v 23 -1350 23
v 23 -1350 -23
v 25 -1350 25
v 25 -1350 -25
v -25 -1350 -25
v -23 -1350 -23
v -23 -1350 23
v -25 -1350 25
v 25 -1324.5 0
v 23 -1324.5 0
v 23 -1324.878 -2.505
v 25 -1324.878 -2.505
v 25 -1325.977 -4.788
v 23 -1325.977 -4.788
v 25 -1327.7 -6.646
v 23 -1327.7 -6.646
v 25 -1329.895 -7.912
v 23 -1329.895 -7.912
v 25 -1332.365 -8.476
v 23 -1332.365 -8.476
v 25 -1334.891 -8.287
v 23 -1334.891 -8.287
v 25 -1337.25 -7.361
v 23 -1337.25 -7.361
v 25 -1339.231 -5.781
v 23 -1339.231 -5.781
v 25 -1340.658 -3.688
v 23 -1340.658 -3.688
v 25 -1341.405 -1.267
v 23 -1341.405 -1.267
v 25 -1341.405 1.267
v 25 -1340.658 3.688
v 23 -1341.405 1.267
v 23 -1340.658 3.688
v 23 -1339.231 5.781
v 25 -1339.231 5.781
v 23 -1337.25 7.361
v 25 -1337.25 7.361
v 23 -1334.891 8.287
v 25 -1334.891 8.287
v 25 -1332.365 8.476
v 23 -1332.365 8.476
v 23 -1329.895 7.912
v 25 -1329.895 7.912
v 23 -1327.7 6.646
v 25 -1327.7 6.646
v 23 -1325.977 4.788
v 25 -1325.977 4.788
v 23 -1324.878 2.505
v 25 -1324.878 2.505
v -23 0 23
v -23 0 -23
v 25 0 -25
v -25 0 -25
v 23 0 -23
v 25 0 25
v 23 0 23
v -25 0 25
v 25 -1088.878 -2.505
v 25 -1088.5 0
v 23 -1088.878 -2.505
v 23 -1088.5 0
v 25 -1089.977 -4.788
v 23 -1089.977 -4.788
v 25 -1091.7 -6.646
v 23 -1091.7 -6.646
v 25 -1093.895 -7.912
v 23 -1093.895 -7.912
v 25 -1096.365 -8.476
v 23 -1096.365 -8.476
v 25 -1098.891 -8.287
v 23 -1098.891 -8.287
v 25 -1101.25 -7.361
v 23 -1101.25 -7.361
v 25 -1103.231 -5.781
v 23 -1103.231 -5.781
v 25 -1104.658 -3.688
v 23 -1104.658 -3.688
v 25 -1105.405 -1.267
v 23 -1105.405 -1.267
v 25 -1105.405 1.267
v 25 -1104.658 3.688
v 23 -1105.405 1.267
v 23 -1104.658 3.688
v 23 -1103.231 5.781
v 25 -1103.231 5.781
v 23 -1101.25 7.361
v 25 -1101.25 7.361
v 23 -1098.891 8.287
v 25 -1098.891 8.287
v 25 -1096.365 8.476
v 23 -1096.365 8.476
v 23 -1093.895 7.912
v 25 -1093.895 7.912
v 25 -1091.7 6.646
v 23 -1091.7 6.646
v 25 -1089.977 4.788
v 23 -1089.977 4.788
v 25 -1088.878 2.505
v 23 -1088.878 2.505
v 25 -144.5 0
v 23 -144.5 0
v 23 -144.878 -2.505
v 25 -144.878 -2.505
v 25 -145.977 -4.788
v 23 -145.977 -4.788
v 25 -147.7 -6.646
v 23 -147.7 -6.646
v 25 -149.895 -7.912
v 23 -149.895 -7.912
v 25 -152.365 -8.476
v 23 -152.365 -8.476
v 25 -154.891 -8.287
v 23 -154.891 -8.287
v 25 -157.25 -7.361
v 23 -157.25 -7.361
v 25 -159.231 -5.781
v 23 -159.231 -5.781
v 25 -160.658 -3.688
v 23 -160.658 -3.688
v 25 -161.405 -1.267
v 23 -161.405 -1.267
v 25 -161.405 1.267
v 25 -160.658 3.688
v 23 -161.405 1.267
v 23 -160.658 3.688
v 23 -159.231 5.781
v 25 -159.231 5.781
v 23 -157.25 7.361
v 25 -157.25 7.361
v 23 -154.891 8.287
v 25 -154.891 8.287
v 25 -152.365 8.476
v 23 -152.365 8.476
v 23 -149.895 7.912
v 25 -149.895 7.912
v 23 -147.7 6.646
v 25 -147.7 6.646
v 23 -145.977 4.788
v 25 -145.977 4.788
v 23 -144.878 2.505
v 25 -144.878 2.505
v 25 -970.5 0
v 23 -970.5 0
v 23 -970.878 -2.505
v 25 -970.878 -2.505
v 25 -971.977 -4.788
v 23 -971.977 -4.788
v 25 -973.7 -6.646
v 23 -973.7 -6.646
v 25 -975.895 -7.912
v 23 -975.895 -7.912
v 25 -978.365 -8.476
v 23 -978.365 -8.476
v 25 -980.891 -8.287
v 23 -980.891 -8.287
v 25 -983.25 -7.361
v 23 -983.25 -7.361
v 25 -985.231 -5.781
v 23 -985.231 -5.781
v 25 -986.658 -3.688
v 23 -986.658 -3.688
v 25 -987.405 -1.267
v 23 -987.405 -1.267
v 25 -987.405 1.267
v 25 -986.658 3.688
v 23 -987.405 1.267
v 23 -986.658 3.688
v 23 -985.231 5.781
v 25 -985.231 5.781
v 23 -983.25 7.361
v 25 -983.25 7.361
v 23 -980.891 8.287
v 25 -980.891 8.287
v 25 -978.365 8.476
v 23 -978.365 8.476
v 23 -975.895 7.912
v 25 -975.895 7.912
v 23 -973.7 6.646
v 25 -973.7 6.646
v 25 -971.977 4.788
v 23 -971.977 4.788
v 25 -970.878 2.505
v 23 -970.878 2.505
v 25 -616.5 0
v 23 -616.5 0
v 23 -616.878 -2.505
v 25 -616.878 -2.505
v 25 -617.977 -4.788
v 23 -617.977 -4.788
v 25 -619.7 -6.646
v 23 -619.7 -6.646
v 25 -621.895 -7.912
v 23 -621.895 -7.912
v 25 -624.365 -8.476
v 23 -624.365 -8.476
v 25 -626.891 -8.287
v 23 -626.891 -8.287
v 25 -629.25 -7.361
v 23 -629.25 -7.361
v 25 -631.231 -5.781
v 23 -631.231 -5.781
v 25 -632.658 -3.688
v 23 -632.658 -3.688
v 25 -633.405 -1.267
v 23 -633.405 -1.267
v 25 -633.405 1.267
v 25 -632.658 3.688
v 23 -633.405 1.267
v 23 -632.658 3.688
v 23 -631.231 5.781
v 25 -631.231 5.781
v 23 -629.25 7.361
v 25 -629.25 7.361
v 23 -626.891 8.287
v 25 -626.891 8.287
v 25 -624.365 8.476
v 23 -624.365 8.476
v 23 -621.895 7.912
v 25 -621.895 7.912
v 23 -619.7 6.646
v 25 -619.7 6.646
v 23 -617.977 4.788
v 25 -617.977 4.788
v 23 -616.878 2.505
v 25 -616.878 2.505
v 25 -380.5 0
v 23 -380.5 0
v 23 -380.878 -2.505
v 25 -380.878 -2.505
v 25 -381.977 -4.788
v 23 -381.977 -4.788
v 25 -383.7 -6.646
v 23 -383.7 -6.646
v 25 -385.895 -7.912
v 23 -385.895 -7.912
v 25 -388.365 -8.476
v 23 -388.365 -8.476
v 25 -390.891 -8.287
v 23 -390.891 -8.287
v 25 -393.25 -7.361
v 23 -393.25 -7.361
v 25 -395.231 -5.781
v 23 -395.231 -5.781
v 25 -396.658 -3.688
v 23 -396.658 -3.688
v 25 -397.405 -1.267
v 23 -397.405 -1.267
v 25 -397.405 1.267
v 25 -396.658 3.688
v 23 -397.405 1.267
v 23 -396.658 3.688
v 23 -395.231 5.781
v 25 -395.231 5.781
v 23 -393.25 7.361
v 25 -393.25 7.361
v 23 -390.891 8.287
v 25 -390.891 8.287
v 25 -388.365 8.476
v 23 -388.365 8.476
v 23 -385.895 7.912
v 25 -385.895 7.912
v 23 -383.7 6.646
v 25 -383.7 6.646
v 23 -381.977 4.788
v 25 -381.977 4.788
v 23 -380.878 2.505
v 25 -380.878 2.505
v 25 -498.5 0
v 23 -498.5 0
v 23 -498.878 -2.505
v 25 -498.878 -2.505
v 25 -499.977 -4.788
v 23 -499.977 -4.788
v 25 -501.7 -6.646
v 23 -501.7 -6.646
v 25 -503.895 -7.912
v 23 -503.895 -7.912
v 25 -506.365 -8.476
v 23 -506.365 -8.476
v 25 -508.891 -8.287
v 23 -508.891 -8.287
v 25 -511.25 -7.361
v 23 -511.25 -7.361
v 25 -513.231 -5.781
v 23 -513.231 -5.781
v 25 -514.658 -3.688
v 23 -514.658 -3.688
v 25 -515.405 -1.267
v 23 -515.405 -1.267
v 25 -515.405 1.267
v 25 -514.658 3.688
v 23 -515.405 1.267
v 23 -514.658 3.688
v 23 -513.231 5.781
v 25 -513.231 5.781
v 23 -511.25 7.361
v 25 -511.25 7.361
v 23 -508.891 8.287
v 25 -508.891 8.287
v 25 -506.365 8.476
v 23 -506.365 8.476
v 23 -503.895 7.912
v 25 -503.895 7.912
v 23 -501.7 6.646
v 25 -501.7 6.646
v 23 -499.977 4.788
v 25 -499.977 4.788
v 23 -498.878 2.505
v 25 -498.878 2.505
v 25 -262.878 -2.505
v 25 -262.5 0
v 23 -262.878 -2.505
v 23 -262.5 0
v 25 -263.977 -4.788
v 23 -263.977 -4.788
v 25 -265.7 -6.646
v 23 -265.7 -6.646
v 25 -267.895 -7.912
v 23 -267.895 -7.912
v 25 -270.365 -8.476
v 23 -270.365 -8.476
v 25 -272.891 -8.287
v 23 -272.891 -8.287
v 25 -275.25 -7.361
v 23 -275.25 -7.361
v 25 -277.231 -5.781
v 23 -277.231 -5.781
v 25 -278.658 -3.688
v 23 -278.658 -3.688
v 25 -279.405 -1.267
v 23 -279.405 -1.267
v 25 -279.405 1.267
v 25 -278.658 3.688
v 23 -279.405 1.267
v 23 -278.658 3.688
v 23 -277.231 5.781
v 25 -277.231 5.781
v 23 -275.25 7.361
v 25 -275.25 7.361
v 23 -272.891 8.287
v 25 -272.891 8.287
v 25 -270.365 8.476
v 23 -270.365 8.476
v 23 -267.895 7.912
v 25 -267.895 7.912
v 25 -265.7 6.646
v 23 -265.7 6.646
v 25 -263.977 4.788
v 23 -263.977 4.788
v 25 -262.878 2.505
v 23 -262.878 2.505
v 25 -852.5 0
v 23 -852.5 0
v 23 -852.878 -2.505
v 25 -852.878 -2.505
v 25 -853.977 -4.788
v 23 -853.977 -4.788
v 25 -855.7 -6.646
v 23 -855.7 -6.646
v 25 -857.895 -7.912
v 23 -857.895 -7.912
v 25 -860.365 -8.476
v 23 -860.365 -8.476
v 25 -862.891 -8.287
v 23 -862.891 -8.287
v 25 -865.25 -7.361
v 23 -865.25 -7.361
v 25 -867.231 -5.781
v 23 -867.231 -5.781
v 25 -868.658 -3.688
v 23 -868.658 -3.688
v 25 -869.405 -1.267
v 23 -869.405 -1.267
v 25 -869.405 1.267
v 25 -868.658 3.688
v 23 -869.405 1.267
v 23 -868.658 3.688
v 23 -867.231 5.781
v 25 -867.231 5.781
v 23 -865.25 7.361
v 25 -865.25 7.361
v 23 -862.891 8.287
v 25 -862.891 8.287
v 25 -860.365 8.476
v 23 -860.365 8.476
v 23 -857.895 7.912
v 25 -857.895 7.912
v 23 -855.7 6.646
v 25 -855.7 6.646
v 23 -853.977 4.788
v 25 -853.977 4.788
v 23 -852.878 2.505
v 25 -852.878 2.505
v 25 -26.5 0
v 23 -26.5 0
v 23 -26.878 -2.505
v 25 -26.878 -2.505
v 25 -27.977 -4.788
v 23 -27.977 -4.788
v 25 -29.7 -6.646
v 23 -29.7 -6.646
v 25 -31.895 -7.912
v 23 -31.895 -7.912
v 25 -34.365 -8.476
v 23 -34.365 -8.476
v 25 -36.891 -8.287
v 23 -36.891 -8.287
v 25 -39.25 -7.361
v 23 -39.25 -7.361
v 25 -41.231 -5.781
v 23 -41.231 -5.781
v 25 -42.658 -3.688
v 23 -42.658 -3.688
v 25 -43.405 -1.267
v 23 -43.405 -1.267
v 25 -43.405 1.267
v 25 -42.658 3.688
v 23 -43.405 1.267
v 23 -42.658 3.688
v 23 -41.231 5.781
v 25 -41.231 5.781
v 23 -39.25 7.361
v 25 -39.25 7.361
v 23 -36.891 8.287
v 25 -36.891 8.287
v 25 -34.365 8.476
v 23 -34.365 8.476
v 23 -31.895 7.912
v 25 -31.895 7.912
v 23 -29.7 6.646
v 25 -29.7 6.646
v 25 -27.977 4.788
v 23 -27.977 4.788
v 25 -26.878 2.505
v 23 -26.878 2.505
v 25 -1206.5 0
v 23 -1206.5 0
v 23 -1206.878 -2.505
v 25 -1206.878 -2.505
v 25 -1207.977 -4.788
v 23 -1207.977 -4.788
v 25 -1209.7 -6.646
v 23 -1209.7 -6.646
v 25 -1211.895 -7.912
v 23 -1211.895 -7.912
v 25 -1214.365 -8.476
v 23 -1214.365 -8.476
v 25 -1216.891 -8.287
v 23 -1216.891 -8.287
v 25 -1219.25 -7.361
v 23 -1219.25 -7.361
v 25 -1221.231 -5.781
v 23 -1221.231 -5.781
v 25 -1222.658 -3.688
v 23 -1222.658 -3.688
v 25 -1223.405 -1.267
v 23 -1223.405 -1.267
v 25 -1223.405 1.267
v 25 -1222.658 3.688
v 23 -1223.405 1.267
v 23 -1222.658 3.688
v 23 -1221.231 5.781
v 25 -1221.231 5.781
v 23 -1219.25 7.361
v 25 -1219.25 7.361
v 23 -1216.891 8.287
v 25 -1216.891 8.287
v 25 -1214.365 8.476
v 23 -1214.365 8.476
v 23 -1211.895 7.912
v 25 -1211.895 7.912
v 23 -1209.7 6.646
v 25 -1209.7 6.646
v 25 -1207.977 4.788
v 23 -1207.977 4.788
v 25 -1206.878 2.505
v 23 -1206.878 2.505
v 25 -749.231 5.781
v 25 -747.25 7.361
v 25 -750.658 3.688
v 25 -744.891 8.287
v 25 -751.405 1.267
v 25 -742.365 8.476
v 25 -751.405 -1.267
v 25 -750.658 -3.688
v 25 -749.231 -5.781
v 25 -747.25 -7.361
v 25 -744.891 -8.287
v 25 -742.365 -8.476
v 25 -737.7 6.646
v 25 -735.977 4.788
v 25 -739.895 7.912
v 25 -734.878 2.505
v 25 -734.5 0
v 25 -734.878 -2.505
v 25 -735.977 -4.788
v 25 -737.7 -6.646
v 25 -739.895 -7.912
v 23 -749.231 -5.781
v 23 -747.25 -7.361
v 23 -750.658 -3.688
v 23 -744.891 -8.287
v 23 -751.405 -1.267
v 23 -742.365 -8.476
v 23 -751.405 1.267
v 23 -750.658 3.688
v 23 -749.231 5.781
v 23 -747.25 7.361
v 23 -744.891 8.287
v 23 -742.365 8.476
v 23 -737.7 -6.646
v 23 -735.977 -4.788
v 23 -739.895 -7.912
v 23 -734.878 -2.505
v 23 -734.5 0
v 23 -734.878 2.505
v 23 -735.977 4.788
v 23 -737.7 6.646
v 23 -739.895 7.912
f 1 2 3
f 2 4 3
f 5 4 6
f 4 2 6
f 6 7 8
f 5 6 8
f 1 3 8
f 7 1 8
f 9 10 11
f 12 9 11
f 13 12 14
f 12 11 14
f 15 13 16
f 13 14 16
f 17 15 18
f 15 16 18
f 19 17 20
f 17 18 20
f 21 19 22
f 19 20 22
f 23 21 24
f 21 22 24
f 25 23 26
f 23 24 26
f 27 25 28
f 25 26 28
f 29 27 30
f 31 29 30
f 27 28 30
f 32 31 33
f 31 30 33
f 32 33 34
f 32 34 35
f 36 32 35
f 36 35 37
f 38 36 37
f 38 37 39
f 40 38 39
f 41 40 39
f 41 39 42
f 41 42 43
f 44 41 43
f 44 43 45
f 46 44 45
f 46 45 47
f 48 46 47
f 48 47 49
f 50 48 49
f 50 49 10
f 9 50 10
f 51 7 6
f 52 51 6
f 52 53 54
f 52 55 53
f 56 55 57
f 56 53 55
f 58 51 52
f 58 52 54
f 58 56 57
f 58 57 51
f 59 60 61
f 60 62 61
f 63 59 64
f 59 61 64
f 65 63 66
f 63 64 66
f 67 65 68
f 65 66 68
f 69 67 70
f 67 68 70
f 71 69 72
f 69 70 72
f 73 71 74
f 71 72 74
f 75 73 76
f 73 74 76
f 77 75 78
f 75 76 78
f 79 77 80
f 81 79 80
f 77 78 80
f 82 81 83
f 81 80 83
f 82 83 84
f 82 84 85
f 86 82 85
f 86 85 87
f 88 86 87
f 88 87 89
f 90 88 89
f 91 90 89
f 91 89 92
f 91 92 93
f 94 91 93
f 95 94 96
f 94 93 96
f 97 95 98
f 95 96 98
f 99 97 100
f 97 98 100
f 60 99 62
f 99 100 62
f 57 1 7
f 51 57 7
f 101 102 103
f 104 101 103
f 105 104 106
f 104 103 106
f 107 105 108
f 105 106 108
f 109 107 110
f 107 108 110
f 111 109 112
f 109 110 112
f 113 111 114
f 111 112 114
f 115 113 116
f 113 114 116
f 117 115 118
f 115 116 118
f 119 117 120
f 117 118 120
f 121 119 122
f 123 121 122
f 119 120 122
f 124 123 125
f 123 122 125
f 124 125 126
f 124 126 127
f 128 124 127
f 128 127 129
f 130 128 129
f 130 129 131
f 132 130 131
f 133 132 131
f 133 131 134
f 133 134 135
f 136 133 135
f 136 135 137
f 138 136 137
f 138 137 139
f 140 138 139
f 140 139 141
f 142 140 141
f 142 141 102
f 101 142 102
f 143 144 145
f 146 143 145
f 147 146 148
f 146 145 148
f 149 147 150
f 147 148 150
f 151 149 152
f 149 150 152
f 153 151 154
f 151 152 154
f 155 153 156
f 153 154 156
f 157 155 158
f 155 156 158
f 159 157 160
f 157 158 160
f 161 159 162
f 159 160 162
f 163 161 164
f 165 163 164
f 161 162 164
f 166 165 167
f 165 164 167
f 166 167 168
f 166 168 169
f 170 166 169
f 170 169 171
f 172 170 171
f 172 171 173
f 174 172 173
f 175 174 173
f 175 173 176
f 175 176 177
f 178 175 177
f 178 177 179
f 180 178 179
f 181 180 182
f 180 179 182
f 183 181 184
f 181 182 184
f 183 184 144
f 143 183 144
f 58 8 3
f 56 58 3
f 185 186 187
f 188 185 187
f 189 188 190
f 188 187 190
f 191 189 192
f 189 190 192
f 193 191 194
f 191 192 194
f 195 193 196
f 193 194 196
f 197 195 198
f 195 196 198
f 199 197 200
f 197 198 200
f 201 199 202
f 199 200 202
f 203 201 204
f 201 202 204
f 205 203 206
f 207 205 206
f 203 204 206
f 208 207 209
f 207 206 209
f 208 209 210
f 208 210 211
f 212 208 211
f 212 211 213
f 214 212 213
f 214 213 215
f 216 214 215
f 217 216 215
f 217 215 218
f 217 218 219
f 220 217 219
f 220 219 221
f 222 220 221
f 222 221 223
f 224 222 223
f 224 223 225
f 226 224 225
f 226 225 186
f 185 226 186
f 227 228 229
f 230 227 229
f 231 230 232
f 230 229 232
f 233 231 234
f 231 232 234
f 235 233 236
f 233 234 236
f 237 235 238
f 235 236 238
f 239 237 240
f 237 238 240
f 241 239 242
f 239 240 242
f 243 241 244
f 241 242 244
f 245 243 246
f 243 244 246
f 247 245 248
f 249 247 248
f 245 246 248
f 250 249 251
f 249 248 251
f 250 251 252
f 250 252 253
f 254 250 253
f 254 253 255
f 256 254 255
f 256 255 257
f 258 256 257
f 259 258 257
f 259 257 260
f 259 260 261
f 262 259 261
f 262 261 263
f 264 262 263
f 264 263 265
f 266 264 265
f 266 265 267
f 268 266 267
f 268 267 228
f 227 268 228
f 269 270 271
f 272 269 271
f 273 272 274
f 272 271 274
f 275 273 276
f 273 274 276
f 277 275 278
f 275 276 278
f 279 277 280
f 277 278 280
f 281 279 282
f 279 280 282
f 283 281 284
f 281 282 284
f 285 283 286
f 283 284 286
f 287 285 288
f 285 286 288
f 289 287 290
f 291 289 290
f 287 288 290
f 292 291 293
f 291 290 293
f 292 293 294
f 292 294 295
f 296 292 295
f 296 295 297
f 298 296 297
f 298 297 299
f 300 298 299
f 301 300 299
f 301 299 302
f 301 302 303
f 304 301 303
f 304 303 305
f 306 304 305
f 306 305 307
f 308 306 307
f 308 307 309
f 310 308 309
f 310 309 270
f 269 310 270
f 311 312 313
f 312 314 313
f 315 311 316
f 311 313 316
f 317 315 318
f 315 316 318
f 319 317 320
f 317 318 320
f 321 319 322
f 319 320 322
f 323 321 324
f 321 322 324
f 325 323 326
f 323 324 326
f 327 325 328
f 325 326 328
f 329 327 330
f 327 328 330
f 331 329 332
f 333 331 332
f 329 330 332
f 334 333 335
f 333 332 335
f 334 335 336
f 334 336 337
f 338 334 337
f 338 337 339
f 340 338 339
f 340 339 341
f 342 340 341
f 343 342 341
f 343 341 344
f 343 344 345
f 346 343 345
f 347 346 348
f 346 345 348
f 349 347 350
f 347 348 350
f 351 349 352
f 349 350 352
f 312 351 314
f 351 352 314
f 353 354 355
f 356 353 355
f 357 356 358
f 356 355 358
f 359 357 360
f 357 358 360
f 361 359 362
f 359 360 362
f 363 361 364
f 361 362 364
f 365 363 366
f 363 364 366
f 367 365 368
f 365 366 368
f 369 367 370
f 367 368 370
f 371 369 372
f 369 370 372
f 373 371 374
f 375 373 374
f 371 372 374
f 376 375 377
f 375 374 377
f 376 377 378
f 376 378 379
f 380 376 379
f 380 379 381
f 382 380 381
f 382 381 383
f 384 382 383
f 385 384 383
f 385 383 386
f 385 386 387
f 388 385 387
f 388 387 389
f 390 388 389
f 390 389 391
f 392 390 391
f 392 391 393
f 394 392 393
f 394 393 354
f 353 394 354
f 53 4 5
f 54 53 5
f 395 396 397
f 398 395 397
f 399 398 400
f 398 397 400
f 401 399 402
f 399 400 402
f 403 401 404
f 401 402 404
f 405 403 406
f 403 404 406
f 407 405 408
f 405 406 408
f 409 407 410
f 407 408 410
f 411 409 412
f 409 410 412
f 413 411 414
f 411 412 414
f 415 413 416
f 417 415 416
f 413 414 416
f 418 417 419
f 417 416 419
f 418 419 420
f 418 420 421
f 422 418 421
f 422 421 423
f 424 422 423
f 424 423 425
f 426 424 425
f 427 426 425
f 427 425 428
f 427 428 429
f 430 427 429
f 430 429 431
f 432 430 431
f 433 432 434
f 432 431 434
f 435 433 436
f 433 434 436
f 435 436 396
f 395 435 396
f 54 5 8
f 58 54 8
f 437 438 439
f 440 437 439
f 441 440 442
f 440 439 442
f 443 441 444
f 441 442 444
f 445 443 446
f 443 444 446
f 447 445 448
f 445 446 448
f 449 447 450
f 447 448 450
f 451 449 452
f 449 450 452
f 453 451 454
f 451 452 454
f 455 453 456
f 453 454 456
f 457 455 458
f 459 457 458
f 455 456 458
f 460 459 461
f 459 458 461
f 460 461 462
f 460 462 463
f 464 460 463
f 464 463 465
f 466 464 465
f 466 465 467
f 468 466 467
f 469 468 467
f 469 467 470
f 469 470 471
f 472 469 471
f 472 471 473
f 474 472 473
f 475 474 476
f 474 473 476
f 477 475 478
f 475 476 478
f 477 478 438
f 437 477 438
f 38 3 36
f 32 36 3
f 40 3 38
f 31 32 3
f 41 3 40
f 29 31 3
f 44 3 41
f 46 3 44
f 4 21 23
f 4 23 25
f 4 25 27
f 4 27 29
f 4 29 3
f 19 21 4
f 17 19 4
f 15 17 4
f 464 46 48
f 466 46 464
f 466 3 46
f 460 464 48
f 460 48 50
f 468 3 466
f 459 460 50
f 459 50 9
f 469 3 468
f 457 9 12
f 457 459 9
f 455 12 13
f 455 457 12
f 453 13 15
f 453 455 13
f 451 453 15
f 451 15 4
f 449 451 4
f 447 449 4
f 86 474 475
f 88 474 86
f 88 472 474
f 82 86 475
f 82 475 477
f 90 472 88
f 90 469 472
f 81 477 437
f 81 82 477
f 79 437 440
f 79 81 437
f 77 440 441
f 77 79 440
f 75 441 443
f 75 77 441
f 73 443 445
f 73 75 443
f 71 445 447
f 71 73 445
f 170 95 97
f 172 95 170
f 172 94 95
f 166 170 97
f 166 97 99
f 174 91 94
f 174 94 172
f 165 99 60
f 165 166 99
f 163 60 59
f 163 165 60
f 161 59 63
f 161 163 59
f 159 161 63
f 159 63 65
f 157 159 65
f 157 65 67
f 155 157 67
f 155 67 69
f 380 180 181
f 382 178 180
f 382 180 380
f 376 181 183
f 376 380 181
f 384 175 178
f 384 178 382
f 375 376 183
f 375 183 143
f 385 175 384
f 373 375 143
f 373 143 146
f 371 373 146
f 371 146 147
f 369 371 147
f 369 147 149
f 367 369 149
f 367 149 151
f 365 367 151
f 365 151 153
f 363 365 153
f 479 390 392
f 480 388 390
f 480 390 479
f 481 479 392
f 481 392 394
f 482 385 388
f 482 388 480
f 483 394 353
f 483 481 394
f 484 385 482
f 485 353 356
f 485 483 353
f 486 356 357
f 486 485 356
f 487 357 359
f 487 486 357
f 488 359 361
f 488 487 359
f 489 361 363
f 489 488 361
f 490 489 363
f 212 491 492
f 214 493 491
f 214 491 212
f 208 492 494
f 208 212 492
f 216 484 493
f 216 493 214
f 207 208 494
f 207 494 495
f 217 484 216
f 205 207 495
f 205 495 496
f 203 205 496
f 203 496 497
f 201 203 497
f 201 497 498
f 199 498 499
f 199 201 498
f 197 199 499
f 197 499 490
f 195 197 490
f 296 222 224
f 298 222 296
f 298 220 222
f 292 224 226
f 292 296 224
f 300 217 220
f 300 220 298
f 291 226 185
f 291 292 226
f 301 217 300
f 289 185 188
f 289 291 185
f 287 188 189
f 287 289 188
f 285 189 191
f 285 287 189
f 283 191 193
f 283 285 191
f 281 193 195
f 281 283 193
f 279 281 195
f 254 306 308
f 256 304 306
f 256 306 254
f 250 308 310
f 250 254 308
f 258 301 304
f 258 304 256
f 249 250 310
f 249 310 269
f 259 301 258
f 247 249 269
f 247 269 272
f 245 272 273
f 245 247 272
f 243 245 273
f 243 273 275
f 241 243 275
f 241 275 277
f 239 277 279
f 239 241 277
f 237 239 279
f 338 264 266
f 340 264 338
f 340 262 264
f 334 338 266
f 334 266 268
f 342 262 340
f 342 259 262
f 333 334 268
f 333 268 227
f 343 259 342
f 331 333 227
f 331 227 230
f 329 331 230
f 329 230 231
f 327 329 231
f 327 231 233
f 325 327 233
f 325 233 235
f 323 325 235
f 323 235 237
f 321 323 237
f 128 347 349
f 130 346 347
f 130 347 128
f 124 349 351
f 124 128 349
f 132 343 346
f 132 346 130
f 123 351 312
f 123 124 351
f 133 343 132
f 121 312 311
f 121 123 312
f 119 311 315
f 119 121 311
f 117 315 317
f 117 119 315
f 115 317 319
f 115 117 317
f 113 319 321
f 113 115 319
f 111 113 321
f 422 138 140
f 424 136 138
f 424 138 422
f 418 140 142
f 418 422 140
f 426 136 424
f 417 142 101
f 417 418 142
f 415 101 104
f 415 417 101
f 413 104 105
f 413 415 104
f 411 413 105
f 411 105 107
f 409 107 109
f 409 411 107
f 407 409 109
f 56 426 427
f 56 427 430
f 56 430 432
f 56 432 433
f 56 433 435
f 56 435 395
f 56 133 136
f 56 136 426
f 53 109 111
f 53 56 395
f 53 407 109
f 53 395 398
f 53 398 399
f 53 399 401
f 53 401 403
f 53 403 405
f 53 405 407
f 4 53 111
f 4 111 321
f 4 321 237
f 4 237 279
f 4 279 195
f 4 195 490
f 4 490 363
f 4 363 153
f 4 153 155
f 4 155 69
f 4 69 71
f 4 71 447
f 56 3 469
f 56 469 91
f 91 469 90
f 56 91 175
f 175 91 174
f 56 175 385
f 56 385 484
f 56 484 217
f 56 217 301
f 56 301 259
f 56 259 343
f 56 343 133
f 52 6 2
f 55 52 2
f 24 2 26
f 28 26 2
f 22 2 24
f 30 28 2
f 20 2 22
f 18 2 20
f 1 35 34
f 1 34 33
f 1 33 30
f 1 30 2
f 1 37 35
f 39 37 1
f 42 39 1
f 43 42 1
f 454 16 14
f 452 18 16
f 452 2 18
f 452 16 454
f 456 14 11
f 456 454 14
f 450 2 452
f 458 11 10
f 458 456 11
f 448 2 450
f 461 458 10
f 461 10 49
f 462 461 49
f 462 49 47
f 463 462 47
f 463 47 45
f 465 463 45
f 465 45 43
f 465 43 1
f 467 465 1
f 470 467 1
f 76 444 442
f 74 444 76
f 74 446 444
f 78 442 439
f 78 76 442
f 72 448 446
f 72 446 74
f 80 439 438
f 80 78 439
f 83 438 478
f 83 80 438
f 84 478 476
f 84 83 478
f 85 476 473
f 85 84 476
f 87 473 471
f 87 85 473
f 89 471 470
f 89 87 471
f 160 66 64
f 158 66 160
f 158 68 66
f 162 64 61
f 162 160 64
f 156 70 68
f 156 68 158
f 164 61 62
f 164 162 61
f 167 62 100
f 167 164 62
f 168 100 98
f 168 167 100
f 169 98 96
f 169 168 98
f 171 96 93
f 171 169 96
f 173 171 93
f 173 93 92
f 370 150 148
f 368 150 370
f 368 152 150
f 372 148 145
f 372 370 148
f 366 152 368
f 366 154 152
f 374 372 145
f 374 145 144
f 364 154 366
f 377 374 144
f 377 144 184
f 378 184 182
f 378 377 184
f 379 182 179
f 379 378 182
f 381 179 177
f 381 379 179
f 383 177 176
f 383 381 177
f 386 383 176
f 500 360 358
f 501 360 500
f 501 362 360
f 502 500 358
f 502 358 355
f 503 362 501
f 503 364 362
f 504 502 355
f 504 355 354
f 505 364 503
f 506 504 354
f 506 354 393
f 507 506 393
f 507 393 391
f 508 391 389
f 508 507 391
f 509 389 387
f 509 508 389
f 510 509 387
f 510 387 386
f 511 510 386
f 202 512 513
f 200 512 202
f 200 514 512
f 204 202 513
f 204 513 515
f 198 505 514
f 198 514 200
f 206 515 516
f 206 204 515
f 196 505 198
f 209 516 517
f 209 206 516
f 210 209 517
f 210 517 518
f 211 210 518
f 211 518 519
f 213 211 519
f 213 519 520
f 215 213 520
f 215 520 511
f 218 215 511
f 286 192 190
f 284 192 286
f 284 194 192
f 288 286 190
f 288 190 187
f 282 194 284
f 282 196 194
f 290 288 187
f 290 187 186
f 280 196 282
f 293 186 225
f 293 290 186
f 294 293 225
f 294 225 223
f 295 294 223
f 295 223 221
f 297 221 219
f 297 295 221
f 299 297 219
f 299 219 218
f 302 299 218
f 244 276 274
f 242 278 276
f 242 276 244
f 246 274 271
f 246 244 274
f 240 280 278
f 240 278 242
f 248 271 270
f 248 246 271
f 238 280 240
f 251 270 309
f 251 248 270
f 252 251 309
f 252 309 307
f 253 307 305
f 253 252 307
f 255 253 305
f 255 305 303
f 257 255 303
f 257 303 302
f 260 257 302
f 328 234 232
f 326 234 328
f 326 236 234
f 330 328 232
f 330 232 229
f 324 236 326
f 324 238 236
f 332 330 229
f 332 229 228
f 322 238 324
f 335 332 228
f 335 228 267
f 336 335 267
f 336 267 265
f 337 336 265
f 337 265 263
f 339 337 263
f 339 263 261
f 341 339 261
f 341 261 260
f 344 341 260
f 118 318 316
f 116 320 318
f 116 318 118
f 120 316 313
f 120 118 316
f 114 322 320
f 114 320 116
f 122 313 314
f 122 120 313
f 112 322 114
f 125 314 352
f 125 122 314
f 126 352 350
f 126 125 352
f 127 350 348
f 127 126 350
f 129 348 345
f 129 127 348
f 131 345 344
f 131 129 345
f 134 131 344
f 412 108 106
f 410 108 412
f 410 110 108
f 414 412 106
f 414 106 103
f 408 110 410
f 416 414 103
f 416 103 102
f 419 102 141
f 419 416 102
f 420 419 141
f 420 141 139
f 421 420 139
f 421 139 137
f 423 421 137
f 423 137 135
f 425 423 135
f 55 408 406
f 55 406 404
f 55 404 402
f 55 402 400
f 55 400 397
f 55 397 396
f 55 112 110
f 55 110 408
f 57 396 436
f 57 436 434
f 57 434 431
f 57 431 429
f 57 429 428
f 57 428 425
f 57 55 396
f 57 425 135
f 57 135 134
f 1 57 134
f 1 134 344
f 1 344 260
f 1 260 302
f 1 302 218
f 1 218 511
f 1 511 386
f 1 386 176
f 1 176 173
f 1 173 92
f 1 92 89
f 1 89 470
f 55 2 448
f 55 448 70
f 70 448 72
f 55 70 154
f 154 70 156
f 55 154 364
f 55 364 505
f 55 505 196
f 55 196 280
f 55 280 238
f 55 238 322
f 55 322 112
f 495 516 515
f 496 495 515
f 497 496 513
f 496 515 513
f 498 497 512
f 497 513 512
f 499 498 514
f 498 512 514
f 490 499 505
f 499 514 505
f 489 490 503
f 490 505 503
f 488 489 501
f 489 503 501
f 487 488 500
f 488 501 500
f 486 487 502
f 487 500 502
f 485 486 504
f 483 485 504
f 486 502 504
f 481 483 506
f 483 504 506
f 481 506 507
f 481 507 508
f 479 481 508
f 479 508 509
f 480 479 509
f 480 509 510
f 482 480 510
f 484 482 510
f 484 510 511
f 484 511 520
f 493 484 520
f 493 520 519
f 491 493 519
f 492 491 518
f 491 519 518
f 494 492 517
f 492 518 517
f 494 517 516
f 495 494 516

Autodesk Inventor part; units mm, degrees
ref_plane "YZ Plane" through (0, 0, 0) normal (1, 0, 0) x (0, 1, 0)
ref_plane "XZ Plane" through (0, 0, 0) normal (0, 1, 0) x (-1, 0, 0)
ref_plane "XY Plane" through (0, 0, 0) normal (0, 0, 1) x (1, 0, 0)
sketch "Sketch9" plane through (0, 0, 0) normal (0, 1, 0) x (-1, 0, 0)
  line L0 (25, 25) -> (-25, 25)
  line L1 (-25, 25) -> (-25, -25)
  line L2 (-25, -25) -> (25, -25)
  line L3 (25, -25) -> (25, 25)
  line L4 (25, 25) -> (-25, -25) construction
  line L5 (-25, 25) -> (25, -25) construction
  line L6 (-23, 23) -> (23, 23)
  line L7 (23, 23) -> (23, -23)
  line L8 (23, -23) -> (-23, -23)
  line L9 (-23, -23) -> (-23, 23)
  point P0 (0, 0)
  dimension "d172" = 50
  dimension "d173" = 50
  dimension "d174" = 2
extrude "Extrusion3" add sketch "Sketch9" against normal blind 1350
sketch "Sketch10" plane through (0, 0, 0) normal (1, 0, 0) x (0, 1, 0)
  line L0 (0, 25) -> (0, -25) construction
  line L1 (0, 25) -> (-1350, 25) construction
  line L2 (-1350, -25) -> (-1350, 25) construction
  line L3 (0, -25) -> (-1350, -25) construction
  line L4 (-43.5, 8.5) -> (-26.5, 8.5)
  line L5 (-26.5, 8.5) -> (-26.5, -8.5)
  line L6 (-26.5, -8.5) -> (-43.5, -8.5)
  line L7 (-43.5, -8.5) -> (-43.5, 8.5)
  line L8 (-43.5, 8.5) -> (-26.5, -8.5) construction
  line L9 (-26.5, 8.5) -> (-43.5, -8.5) construction
  line L10 (0, 0) -> (50, 0)
  circle A0 centre (-35, 0) radius 8.5
  dimension "d177" = 17
  dimension "d178" = 17
  dimension "d181" = 50
  dimension "d190" = 35
extrude "Extrusion4" cut sketch "Sketch10" along normal through all contours A0
pattern_linear "Rectangular Pattern4" count 12 spacing 118 along (0, -1, 0) of "Extrusion4"
properties part number "TKS 3521 FDS way 1" material "Stainless Steel"
